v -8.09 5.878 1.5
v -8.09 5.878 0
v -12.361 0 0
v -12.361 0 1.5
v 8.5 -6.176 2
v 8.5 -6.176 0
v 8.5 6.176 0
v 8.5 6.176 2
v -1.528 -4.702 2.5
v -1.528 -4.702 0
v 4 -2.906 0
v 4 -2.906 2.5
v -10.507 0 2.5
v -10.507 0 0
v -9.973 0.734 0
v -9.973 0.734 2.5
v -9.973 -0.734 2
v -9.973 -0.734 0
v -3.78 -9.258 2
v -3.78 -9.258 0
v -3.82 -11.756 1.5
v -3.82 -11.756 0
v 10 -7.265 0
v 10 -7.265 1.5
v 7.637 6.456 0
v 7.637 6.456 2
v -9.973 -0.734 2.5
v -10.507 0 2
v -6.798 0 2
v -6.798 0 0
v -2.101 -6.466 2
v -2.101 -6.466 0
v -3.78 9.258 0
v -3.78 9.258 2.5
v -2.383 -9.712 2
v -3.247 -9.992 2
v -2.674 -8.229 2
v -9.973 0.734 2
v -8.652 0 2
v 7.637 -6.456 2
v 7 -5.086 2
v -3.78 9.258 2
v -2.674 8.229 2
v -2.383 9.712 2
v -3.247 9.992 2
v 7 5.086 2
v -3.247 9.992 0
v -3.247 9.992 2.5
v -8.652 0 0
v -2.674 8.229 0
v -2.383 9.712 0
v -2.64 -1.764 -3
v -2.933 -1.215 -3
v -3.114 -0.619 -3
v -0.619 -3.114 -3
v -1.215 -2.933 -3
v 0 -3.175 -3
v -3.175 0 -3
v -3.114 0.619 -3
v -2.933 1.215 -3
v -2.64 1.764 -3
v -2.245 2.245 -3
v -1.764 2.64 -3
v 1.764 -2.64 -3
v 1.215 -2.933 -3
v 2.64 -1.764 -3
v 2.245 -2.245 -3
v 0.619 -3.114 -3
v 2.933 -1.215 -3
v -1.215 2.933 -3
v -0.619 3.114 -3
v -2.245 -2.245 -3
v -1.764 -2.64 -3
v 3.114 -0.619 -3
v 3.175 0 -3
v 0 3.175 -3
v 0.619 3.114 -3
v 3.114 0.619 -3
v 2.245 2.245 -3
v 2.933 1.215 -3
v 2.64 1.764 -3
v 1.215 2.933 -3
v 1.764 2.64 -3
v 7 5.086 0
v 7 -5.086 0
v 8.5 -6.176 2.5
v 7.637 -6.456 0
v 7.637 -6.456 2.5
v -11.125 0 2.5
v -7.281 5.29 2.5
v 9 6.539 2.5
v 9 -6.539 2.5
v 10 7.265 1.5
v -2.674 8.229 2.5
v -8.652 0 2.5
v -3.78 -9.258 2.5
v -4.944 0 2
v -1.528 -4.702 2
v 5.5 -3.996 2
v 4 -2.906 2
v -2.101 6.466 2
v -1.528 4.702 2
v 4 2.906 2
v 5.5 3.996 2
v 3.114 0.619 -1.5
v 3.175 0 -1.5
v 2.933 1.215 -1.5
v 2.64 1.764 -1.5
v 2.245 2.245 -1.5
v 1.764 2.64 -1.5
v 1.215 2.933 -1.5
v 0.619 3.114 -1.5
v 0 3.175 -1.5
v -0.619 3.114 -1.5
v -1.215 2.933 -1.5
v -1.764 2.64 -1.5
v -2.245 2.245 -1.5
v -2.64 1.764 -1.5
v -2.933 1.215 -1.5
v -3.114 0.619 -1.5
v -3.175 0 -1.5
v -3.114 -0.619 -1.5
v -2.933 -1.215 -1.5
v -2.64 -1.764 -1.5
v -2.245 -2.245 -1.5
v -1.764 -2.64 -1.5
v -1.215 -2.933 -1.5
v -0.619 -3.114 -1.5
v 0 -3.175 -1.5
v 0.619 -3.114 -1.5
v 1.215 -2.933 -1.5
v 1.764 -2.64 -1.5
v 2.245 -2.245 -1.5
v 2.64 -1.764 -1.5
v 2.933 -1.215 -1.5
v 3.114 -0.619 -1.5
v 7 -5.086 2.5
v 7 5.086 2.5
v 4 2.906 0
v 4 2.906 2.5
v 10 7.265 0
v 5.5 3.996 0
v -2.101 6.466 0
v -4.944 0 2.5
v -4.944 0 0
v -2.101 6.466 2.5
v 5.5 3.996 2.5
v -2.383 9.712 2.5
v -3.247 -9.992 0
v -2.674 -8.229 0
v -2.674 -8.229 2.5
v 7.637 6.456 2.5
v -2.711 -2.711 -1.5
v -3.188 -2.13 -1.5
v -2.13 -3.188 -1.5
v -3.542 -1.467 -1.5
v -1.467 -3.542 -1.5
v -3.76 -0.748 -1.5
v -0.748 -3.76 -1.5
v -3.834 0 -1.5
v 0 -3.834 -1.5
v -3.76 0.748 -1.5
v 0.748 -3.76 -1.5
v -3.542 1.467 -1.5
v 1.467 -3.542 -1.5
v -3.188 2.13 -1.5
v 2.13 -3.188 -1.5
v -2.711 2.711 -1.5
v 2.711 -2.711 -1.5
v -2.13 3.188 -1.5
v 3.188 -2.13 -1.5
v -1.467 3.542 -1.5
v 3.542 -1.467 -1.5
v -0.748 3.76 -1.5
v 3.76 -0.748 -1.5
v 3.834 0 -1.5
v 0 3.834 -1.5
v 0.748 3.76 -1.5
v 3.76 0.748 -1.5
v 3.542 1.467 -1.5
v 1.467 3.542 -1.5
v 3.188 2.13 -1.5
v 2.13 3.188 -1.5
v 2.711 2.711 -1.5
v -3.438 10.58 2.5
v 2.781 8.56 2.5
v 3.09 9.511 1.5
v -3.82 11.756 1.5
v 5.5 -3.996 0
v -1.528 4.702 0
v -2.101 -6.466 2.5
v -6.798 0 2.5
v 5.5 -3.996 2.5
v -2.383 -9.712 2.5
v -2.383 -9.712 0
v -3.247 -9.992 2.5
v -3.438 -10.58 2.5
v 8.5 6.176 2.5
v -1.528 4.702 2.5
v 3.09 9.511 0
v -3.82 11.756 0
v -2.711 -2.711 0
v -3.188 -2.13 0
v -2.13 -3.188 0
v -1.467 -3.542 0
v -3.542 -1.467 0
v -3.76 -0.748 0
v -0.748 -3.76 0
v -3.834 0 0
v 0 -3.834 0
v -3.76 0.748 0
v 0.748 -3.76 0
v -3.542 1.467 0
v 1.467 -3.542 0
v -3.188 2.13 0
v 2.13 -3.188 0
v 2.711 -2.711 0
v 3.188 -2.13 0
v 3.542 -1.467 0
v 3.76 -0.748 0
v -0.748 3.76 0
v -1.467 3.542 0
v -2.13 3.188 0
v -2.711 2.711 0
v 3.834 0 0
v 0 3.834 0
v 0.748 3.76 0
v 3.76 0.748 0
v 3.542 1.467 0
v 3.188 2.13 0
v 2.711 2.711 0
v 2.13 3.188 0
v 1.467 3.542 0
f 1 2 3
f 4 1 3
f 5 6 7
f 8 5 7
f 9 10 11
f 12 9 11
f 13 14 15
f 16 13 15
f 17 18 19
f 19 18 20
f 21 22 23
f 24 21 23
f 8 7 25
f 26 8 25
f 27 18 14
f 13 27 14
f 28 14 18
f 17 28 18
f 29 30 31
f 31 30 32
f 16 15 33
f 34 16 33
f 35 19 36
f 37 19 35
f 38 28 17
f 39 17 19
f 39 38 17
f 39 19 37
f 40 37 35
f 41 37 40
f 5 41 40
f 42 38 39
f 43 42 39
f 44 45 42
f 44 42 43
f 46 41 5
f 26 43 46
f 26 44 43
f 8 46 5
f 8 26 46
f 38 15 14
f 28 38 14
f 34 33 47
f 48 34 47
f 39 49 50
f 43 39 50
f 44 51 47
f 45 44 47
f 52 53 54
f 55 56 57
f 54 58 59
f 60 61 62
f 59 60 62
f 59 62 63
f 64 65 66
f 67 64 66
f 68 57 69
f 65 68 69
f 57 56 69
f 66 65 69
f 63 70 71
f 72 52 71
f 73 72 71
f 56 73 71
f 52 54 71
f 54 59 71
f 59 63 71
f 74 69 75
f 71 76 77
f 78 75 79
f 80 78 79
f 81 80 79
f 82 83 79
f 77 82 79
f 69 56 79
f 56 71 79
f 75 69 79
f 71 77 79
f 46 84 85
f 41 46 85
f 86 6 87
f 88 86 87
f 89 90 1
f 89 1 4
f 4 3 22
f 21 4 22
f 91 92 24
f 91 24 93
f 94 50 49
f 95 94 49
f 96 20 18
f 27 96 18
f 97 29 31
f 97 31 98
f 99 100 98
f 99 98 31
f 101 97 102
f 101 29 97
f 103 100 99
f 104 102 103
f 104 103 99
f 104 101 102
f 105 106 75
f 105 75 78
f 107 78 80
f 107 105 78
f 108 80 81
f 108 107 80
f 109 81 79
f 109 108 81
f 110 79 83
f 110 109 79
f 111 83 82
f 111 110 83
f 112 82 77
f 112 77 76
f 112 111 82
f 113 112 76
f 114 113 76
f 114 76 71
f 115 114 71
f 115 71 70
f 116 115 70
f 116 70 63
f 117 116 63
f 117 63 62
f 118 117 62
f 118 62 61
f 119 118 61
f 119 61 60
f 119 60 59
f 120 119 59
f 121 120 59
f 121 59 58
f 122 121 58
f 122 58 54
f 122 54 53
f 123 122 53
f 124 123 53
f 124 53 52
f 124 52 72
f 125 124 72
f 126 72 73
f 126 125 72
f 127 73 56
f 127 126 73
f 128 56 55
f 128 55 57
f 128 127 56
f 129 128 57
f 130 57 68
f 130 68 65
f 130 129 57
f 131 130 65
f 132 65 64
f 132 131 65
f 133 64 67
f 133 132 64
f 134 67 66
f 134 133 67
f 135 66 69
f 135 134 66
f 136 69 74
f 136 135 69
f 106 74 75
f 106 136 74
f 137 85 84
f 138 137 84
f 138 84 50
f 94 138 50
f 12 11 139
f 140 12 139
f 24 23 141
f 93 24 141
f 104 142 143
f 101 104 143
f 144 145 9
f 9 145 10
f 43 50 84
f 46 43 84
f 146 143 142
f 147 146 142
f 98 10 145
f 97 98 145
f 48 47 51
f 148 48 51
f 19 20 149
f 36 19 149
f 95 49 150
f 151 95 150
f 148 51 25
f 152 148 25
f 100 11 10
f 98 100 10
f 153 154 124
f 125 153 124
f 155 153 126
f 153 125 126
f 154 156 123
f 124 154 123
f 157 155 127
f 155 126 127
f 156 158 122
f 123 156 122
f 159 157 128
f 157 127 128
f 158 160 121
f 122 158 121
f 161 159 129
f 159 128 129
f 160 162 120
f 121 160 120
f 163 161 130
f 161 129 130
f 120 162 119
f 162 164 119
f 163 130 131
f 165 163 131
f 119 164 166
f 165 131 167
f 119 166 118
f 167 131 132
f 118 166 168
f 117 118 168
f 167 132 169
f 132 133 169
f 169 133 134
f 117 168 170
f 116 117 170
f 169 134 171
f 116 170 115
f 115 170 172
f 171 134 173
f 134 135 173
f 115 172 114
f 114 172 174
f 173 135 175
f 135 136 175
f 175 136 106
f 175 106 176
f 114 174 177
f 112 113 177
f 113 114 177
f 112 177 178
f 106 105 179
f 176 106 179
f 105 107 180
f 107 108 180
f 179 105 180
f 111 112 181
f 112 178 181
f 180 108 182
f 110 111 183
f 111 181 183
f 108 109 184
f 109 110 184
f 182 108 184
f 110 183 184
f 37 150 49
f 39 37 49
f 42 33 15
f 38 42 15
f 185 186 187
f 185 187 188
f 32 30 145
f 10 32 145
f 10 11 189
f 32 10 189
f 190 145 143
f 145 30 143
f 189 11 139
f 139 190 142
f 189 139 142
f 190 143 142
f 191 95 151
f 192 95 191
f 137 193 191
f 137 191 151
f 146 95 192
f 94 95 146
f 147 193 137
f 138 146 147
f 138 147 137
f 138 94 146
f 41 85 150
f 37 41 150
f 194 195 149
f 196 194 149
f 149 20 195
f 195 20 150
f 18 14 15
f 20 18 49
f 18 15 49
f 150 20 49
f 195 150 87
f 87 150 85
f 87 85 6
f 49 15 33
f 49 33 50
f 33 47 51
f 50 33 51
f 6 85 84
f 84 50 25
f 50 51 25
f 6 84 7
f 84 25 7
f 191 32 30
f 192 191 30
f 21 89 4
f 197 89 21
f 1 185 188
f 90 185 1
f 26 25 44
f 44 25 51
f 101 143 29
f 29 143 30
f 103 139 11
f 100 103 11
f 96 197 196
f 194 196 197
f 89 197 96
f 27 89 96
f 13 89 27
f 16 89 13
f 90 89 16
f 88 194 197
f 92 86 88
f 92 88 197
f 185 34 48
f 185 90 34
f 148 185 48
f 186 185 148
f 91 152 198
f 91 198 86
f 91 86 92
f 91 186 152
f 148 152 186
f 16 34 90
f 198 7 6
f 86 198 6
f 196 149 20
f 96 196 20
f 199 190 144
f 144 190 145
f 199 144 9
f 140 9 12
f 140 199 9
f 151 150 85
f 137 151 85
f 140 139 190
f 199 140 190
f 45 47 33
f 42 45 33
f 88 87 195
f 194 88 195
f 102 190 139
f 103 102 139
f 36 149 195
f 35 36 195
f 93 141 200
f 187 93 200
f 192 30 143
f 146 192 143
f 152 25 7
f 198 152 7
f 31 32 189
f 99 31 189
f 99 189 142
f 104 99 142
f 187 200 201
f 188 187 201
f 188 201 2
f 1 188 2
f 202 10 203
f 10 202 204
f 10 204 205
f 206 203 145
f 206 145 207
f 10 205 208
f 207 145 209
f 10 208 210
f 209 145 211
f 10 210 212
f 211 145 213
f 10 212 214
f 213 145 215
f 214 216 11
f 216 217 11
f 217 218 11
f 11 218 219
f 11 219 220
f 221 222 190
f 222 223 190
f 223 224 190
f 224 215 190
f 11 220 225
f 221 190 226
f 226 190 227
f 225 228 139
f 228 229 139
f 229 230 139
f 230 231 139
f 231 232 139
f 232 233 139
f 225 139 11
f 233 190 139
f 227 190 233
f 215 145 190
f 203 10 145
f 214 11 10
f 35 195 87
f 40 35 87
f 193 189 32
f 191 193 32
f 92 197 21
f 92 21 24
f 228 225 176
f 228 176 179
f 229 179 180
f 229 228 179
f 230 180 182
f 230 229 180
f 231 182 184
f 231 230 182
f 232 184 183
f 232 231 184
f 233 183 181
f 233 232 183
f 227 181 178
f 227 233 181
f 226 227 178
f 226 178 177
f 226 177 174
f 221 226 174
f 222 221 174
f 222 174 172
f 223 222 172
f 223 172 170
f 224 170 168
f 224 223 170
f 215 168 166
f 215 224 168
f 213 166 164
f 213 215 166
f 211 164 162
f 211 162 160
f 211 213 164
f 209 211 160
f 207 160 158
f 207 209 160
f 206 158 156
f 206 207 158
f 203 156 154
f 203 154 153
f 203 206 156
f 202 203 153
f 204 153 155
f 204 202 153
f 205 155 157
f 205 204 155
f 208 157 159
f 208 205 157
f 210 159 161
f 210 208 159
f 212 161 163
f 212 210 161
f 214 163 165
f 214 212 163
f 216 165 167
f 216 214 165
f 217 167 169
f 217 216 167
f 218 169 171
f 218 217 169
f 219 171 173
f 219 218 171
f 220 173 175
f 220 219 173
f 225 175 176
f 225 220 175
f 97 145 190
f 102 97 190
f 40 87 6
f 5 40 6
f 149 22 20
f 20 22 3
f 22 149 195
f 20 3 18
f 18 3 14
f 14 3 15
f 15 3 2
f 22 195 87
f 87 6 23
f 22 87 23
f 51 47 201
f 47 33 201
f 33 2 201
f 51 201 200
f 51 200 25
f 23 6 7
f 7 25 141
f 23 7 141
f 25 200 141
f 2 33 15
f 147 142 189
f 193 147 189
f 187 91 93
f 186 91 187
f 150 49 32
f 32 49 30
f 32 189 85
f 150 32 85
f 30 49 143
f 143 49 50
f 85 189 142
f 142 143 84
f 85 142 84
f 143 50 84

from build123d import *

# Parameters (mm, degrees)
F0_R     = 3.8339233168
F0_R_2   = 3.175
F1_DEPTH = 2.5
F2_SIZE  = 1
F3_DEPTH = 3
F4_DEPTH = 1.5
F5_DEPTH = 2


with BuildPart() as f1:
    # F0 (on Top) → F1 (new body)
    with BuildSketch(Plane.XY):
        Polygon((4, -2.906170112), (4, 2.906170112), (-1.527864045, 4.7022820183), (-4.94427191, 0), (-1.527864045, -4.7022820183), align=None)
        Circle(F0_R, mode=Mode.SUBTRACT)
        Circle(F0_R)
        Circle(F0_R_2, mode=Mode.SUBTRACT)
        Circle(F0_R_2)
    extrude(amount=F1_DEPTH)

    # F0 (on Top) → F3 (join)
    with BuildSketch(Plane.XY):
        Circle(F0_R_2)
    extrude(amount=-F3_DEPTH)

    # F0 (on Top) → F4 (join)
    with BuildSketch(Plane.XY):
        Circle(F0_R)
        Circle(F0_R_2, mode=Mode.SUBTRACT)
    extrude(amount=-F4_DEPTH)


with BuildPart() as f1b:
    # F0 (on Top) → F1, piece 2 (new body)
    with BuildSketch(Plane.XY):
        Polygon((7, -5.085797696), (7, 5.085797696), (-2.6737620788, 8.2289935321), (-8.6524758425, 0), (-2.6737620788, -8.2289935321), align=None)
        Polygon((-2.1008130619, 6.4656377752), (5.5, 3.995983904), (5.5, -3.995983904), (-2.1008130619, -6.4656377752), (-6.7983738762, 0), align=None, mode=Mode.SUBTRACT)
    extrude(amount=F1_DEPTH)


with BuildPart() as f1c:
    # F0 (on Top) → F1, piece 3 (new body)
    with BuildSketch(Plane.XY):
        with BuildLine():
            ThreePointArc((-8.0901700058, -5.8778524375), (-6.1711601329, -7.8687217904), (-3.7802935026, -9.2579361109))
            Line((-3.7802935026, -9.2579361109), (-9.9729954018, -0.734413178))
            ThreePointArc((-9.9729954018, -0.734413178), (-9.390592526, -3.4375532011), (-8.0901700058, -5.8778524375))
        make_face()
        with BuildLine():
            ThreePointArc((-9.9729954018, 0.734413178), (-9.3905925168, 3.4375532262), (-8.0901699744, 5.8778524807))
            Line((-8.0901699744, 5.8778524807), (-12.360679775, 0))
            Line((-12.360679775, 0), (-8.0901700058, -5.8778524375))
            ThreePointArc((-8.0901700058, -5.8778524375), (-9.390592526, -3.4375532011), (-9.9729954018, -0.734413178))
            Line((-9.9729954018, -0.734413178), (-10.5065778087, 0))
            Line((-10.5065778087, 0), (-9.9729954018, 0.734413178))
        make_face()
        with BuildLine():
            Line((-3.8196601125, -11.7557050458), (3.0901696906, -9.5105652452))
            ThreePointArc((3.0901696906, -9.5105652452), (0.367454614, -9.9932465749), (-2.3833566254, -9.7118284167))
            Line((-2.3833566254, -9.7118284167), (-3.2467110956, -9.992349289))
            Line((-3.2467110956, -9.992349289), (-3.7802935026, -9.2579361109))
            ThreePointArc((-3.7802935026, -9.2579361109), (-6.1711601329, -7.8687217904), (-8.0901700058, -5.8778524375))
            Line((-8.0901700058, -5.8778524375), (-3.8196601125, -11.7557050458))
        make_face()
        with BuildLine():
            ThreePointArc((3.0901696906, -9.5105652452), (5.5766057109, -8.3006908595), (7.6366455297, -6.4561323603))
            Line((7.6366455297, -6.4561323603), (-2.3833566254, -9.7118284167))
            ThreePointArc((-2.3833566254, -9.7118284167), (0.367454614, -9.9932465749), (3.0901696906, -9.5105652452))
        make_face()
        with BuildLine():
            Line((10, -7.2654252801), (10, 0))
            ThreePointArc((10, 0), (9.6176920308, -2.7386127875), (8.5, -5.2678268764))
            Line((8.5, -5.2678268764), (8.5, -6.175611488))
            Line((8.5, -6.175611488), (7.6366455297, -6.4561323603))
            ThreePointArc((7.6366455297, -6.4561323603), (5.5766057109, -8.3006908595), (3.0901696906, -9.5105652452))
            Line((3.0901696906, -9.5105652452), (10, -7.2654252801))
        make_face()
        with BuildLine():
            ThreePointArc((8.5, -5.2678268764), (9.6176920308, -2.7386127875), (10, 0))
            ThreePointArc((10, 0), (9.6176920308, 2.7386127875), (8.5, 5.2678268764))
            Line((8.5, 5.2678268764), (8.5, -5.2678268764))
        make_face()
        with BuildLine():
            ThreePointArc((8.5, 5.2678268764), (9.6176920308, 2.7386127875), (10, 0))
            Line((10, 0), (10, 7.2654252801))
            Line((10, 7.2654252801), (3.0901697709, 9.5105652191))
            ThreePointArc((3.0901697709, 9.5105652191), (5.5766057459, 8.300690836), (7.6366455297, 6.4561323603))
            Line((7.6366455297, 6.4561323603), (8.5, 6.175611488))
            Line((8.5, 6.175611488), (8.5, 5.2678268764))
        make_face()
        with BuildLine():
            ThreePointArc((-2.3833566254, 9.7118284167), (0.3674546562, 9.9932465733), (3.0901697709, 9.5105652191))
            Line((3.0901697709, 9.5105652191), (-3.8196601125, 11.7557050458))
            Line((-3.8196601125, 11.7557050458), (-8.0901699744, 5.8778524807))
            ThreePointArc((-8.0901699744, 5.8778524807), (-6.1711601119, 7.8687218068), (-3.7802935026, 9.2579361109))
            Line((-3.7802935026, 9.2579361109), (-3.2467110956, 9.992349289))
            Line((-3.2467110956, 9.992349289), (-2.3833566254, 9.7118284167))
        make_face()
        with BuildLine():
            Line((-9.9729954018, 0.734413178), (-3.7802935026, 9.2579361109))
            ThreePointArc((-3.7802935026, 9.2579361109), (-6.1711601119, 7.8687218068), (-8.0901699744, 5.8778524807))
            ThreePointArc((-8.0901699744, 5.8778524807), (-9.3905925168, 3.4375532262), (-9.9729954018, 0.734413178))
        make_face()
        with BuildLine():
            Line((-2.3833566254, 9.7118284167), (7.6366455297, 6.4561323603))
            ThreePointArc((7.6366455297, 6.4561323603), (5.5766057459, 8.300690836), (3.0901697709, 9.5105652191))
            ThreePointArc((3.0901697709, 9.5105652191), (0.3674546562, 9.9932465733), (-2.3833566254, 9.7118284167))
        make_face()
    extrude(amount=F1_DEPTH)

    # F2
    f2_edges = [f1c.edges().sort_by_distance(p)[0] for p in [
        (3.09017, 9.510565, 2.5),
        (-8.09017, 5.877853, 2.5),
        (-8.09017, -5.877853, 2.5),
        (3.09017, -9.510565, 2.5),
        (10, 0, 2.5),
    ]]
    chamfer(f2_edges, length=F2_SIZE)


with BuildPart() as f5:
    # F0 (on Top) → F5 (new body)
    with BuildSketch(Plane.XY):
        with BuildLine():
            Line((8.5, -5.2678268764), (8.5, 5.2678268764))
            ThreePointArc((8.5, 5.2678268764), (8.0901699437, 5.8778525229), (7.6366455297, 6.4561323603))
            Line((7.6366455297, 6.4561323603), (-2.3833566254, 9.7118284167))
            ThreePointArc((-2.3833566254, 9.7118284167), (-3.0901699437, 9.510565163), (-3.7802935026, 9.2579361109))
            Line((-3.7802935026, 9.2579361109), (-9.9729954018, 0.734413178))
            ThreePointArc((-9.9729954018, 0.734413178), (-10, 0), (-9.9729954018, -0.734413178))
            Line((-9.9729954018, -0.734413178), (-3.7802935026, -9.2579361109))
            ThreePointArc((-3.7802935026, -9.2579361109), (-3.0901699437, -9.510565163), (-2.3833566254, -9.7118284167))
            Line((-2.3833566254, -9.7118284167), (7.6366455297, -6.4561323603))
            ThreePointArc((7.6366455297, -6.4561323603), (8.0901699437, -5.8778525229), (8.5, -5.2678268764))
        make_face()
        Polygon((-2.6737620788, 8.2289935321), (7, 5.085797696), (7, -5.085797696), (-2.6737620788, -8.2289935321), (-8.6524758425, 0), align=None, mode=Mode.SUBTRACT)
        with BuildLine():
            ThreePointArc((-9.9729954018, -0.734413178), (-10, 0), (-9.9729954018, 0.734413178))
            Line((-9.9729954018, 0.734413178), (-10.5065778087, 0))
            Line((-10.5065778087, 0), (-9.9729954018, -0.734413178))
        make_face()
        with BuildLine():
            ThreePointArc((-3.7802935026, 9.2579361109), (-3.0901699437, 9.510565163), (-2.3833566254, 9.7118284167))
            Line((-2.3833566254, 9.7118284167), (-3.2467110956, 9.992349289))
            Line((-3.2467110956, 9.992349289), (-3.7802935026, 9.2579361109))
        make_face()
        with BuildLine():
            ThreePointArc((7.6366455297, 6.4561323603), (8.0901699437, 5.8778525229), (8.5, 5.2678268764))
            Line((8.5, 5.2678268764), (8.5, 6.175611488))
            Line((8.5, 6.175611488), (7.6366455297, 6.4561323603))
        make_face()
        with BuildLine():
            Line((8.5, -6.175611488), (8.5, -5.2678268764))
            ThreePointArc((8.5, -5.2678268764), (8.0901699437, -5.8778525229), (7.6366455297, -6.4561323603))
            Line((7.6366455297, -6.4561323603), (8.5, -6.175611488))
        make_face()
        with BuildLine():
            Line((-3.2467110956, -9.992349289), (-2.3833566254, -9.7118284167))
            ThreePointArc((-2.3833566254, -9.7118284167), (-3.0901699437, -9.510565163), (-3.7802935026, -9.2579361109))
            Line((-3.7802935026, -9.2579361109), (-3.2467110956, -9.992349289))
        make_face()
    extrude(amount=F5_DEPTH)


with BuildPart() as f5b:
    # F0 (on Top) → F5, piece 2 (new body)
    with BuildSketch(Plane.XY):
        Polygon((5.5, -3.995983904), (5.5, 3.995983904), (-2.1008130619, 6.4656377752), (-6.7983738762, 0), (-2.1008130619, -6.4656377752), align=None)
        Polygon((-1.527864045, 4.7022820183), (4, 2.906170112), (4, -2.906170112), (-1.527864045, -4.7022820183), (-4.94427191, 0), align=None, mode=Mode.SUBTRACT)
    extrude(amount=F5_DEPTH)


solid = Compound([f1.part, f1b.part, f1c.part, f5.part, f5b.part])
